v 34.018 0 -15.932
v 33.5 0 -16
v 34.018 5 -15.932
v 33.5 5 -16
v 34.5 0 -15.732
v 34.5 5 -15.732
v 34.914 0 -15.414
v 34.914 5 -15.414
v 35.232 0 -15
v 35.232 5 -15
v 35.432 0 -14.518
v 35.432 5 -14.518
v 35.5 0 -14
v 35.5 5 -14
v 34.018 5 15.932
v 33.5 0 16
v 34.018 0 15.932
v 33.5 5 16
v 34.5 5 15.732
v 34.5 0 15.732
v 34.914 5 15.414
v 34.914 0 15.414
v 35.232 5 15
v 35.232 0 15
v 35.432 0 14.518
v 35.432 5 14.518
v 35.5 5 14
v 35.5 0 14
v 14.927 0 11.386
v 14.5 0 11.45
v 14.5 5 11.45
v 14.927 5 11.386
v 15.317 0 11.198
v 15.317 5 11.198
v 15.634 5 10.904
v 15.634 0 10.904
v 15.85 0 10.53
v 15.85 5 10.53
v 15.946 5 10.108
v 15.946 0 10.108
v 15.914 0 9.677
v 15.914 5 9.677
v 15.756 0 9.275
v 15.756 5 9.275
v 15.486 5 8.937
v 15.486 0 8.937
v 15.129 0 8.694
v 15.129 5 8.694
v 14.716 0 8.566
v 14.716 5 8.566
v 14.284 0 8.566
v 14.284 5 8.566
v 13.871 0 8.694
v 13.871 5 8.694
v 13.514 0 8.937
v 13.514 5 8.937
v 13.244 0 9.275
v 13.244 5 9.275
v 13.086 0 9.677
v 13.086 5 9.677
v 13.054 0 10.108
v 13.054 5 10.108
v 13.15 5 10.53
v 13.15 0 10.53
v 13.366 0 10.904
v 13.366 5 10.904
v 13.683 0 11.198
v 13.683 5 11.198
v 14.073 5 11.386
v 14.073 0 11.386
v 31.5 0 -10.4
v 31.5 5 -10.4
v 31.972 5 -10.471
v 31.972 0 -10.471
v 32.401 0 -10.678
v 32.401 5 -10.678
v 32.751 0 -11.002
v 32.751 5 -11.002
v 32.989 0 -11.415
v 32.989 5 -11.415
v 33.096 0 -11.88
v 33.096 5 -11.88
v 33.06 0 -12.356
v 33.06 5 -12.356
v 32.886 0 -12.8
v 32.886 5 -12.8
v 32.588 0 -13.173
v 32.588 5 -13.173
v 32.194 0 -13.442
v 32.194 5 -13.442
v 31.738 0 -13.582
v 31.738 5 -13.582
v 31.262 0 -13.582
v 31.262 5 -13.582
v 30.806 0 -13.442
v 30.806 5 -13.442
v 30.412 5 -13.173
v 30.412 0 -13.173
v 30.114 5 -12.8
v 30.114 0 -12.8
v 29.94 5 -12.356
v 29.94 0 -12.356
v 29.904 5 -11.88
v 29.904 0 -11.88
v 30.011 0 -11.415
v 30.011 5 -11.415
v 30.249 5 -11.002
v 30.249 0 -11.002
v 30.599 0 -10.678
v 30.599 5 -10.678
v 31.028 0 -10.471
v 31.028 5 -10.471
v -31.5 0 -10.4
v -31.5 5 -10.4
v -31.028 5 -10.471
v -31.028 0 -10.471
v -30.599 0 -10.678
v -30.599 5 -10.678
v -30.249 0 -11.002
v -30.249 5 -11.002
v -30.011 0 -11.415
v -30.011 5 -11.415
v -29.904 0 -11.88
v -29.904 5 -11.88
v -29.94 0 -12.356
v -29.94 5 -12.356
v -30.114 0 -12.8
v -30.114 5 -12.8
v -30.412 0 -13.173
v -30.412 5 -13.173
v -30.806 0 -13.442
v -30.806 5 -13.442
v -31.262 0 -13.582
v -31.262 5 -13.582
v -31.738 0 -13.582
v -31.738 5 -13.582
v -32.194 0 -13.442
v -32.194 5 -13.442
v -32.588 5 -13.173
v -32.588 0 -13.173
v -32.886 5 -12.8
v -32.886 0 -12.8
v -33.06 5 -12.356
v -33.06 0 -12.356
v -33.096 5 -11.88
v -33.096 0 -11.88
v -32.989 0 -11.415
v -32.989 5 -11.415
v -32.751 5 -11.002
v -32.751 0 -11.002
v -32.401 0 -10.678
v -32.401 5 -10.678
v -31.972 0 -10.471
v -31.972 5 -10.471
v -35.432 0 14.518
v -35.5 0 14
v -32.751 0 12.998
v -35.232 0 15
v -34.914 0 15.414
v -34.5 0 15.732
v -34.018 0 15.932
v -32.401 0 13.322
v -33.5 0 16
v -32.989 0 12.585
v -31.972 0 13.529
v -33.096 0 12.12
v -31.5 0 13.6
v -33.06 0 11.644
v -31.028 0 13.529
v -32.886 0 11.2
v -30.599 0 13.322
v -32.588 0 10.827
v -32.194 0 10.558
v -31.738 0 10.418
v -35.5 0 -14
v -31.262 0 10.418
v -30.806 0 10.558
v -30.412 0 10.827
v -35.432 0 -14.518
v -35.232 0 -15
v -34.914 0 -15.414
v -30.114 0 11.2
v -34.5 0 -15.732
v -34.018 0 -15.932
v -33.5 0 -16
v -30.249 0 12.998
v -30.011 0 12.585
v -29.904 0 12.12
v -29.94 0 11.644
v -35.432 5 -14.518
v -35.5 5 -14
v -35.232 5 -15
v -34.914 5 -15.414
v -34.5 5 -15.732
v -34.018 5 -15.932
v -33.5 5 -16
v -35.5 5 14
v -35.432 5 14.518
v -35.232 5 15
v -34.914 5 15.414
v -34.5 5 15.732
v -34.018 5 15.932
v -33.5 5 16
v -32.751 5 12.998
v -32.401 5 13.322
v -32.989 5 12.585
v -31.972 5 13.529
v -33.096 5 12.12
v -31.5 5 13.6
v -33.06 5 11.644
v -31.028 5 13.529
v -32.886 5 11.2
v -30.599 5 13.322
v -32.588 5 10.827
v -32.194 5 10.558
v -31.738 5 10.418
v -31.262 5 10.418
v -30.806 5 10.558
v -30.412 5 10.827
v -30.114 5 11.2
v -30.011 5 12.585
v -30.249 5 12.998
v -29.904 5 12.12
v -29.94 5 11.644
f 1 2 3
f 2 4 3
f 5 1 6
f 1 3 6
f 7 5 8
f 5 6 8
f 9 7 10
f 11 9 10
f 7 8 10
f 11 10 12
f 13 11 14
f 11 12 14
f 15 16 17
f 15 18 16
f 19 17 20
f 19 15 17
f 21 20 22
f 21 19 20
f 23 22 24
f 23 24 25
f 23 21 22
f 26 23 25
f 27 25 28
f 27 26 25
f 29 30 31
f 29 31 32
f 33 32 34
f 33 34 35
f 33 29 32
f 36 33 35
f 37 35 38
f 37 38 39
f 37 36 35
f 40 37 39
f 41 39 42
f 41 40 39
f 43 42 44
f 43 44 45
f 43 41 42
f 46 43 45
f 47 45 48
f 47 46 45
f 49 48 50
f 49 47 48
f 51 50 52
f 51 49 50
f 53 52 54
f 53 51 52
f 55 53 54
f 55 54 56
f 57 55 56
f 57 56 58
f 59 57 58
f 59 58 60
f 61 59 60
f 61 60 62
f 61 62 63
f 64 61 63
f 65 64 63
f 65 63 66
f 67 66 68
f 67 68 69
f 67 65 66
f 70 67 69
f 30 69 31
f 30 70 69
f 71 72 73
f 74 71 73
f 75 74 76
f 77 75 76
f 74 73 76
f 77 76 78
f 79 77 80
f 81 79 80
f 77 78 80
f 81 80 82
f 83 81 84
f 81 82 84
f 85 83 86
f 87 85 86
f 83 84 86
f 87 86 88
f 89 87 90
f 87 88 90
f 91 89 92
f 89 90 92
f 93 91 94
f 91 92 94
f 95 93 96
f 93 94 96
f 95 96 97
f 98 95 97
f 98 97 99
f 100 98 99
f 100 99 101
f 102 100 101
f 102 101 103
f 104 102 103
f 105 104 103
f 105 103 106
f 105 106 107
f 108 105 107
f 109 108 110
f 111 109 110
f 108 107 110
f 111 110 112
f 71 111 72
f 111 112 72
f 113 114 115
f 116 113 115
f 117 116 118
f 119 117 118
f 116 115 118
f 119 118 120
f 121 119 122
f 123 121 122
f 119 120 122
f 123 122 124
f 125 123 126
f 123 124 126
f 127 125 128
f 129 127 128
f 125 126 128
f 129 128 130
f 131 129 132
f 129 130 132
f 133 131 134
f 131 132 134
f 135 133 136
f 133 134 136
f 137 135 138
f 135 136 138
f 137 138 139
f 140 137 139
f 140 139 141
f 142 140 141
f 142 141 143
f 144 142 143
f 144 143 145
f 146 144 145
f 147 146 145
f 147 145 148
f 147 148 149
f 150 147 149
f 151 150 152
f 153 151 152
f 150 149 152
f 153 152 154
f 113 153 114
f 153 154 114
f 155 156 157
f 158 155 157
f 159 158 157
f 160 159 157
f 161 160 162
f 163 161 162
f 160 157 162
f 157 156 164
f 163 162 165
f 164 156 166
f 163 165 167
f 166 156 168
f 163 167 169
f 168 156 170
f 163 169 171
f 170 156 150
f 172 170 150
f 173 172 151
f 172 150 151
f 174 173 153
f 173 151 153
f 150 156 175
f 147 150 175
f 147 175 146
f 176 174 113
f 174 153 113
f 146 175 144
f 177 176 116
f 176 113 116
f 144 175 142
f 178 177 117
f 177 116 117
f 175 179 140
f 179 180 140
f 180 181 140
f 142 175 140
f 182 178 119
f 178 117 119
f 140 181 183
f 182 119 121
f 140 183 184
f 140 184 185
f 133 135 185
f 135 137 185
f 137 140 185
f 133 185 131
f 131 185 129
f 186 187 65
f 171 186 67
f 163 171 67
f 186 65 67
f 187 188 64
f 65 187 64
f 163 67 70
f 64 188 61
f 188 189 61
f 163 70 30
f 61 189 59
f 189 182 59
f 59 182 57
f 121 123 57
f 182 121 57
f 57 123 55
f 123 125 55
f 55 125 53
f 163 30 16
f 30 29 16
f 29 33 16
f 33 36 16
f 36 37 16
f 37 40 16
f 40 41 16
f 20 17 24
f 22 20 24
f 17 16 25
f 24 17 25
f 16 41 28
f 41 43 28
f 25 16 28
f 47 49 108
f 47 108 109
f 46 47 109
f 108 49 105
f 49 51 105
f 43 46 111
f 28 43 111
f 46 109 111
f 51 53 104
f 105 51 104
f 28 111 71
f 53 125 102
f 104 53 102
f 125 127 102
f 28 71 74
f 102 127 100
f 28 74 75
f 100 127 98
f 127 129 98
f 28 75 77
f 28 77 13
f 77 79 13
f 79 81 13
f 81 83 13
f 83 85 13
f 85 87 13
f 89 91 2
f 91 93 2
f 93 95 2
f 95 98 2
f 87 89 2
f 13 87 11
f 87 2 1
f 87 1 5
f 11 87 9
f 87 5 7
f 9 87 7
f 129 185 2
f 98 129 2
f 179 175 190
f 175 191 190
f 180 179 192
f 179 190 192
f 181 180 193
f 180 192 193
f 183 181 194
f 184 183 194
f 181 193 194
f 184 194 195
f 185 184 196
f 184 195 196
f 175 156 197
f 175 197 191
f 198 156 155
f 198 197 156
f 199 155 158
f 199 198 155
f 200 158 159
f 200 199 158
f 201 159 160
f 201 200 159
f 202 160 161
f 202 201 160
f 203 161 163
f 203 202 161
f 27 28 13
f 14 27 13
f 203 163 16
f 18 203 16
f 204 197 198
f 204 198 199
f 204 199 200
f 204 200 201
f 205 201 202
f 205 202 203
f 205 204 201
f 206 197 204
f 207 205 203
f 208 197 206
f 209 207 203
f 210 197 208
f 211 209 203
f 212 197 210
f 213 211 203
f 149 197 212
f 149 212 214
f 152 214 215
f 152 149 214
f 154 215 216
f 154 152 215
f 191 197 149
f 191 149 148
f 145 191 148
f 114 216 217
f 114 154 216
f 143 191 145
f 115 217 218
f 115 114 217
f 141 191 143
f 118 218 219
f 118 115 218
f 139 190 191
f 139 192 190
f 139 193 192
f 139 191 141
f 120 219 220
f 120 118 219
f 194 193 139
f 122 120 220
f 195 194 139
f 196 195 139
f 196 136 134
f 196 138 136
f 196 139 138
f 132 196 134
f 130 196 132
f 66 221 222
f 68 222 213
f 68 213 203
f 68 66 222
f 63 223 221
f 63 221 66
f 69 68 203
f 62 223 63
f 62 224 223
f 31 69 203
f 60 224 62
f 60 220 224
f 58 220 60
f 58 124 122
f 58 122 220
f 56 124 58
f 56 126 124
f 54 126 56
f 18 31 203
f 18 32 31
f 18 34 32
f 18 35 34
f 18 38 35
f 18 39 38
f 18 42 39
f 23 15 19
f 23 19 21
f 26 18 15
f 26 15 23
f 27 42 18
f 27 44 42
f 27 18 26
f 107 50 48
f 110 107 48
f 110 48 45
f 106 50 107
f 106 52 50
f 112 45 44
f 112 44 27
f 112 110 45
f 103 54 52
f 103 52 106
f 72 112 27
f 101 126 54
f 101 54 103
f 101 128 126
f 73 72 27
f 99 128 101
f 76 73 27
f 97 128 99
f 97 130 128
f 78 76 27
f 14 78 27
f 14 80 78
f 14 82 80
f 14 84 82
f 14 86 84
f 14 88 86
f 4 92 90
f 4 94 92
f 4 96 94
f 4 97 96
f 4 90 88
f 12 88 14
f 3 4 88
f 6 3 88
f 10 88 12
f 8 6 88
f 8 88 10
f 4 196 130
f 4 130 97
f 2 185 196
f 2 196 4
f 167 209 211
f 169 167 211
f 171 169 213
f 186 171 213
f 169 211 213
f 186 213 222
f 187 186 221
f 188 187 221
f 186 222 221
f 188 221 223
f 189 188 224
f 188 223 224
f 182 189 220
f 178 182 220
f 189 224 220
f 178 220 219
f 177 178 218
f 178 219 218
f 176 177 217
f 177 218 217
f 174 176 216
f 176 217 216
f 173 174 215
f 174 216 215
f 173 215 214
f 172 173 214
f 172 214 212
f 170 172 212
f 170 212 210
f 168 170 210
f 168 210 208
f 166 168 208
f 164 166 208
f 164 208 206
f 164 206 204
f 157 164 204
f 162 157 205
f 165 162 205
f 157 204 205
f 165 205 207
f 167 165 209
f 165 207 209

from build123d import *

# Parameters (mm, degrees)
SKETCH_1_W          = 71
SKETCH_1_H          = 32
SKETCH_1_R          = 1.45
EXTRUDE_1_DEPTH     = 5
SKETCH_2_R          = 1.6
CUT_EXTRUDE_1_DEPTH = 5
FILLET_1_R          = 2


with BuildPart() as part:
    # 草图1 → 凸台-拉伸1 (new body)
    with BuildSketch(Plane(origin=(0, 0, 0), x_dir=(1, 0, 0), z_dir=(0, 1, 0))):
        Rectangle(SKETCH_1_W, SKETCH_1_H)
        with Locations(Location((14.5, -10, 0), (0, 0, 270))):
            Circle(SKETCH_1_R, mode=Mode.SUBTRACT)
    extrude(amount=EXTRUDE_1_DEPTH)

    # 草图2 → 切除-拉伸1 (cut)
    with BuildSketch(Plane(origin=(0, 5, 0), x_dir=(1, 0, 0), z_dir=(0, 1, 0))):
        with Locations(Location((-31.5, 12, 0), (0, 0, 270))):
            Circle(SKETCH_2_R)
        with Locations(Location((-31.5, -12, 0), (0, 0, 270))):
            Circle(SKETCH_2_R)
        with Locations(Location((31.5, 12, 0), (0, 0, 270))):
            Circle(SKETCH_2_R)
    extrude(amount=-CUT_EXTRUDE_1_DEPTH, mode=Mode.SUBTRACT)

    # 圆角1
    fillet_1_edges = [part.edges().sort_by_distance(p)[0] for p in [
        (35.5, 2.5, 16),
        (-35.5, 2.5, 16),
        (-35.5, 2.5, -16),
        (35.5, 2.5, -16),
    ]]
    fillet(fillet_1_edges, radius=FILLET_1_R)


solid = part.part
